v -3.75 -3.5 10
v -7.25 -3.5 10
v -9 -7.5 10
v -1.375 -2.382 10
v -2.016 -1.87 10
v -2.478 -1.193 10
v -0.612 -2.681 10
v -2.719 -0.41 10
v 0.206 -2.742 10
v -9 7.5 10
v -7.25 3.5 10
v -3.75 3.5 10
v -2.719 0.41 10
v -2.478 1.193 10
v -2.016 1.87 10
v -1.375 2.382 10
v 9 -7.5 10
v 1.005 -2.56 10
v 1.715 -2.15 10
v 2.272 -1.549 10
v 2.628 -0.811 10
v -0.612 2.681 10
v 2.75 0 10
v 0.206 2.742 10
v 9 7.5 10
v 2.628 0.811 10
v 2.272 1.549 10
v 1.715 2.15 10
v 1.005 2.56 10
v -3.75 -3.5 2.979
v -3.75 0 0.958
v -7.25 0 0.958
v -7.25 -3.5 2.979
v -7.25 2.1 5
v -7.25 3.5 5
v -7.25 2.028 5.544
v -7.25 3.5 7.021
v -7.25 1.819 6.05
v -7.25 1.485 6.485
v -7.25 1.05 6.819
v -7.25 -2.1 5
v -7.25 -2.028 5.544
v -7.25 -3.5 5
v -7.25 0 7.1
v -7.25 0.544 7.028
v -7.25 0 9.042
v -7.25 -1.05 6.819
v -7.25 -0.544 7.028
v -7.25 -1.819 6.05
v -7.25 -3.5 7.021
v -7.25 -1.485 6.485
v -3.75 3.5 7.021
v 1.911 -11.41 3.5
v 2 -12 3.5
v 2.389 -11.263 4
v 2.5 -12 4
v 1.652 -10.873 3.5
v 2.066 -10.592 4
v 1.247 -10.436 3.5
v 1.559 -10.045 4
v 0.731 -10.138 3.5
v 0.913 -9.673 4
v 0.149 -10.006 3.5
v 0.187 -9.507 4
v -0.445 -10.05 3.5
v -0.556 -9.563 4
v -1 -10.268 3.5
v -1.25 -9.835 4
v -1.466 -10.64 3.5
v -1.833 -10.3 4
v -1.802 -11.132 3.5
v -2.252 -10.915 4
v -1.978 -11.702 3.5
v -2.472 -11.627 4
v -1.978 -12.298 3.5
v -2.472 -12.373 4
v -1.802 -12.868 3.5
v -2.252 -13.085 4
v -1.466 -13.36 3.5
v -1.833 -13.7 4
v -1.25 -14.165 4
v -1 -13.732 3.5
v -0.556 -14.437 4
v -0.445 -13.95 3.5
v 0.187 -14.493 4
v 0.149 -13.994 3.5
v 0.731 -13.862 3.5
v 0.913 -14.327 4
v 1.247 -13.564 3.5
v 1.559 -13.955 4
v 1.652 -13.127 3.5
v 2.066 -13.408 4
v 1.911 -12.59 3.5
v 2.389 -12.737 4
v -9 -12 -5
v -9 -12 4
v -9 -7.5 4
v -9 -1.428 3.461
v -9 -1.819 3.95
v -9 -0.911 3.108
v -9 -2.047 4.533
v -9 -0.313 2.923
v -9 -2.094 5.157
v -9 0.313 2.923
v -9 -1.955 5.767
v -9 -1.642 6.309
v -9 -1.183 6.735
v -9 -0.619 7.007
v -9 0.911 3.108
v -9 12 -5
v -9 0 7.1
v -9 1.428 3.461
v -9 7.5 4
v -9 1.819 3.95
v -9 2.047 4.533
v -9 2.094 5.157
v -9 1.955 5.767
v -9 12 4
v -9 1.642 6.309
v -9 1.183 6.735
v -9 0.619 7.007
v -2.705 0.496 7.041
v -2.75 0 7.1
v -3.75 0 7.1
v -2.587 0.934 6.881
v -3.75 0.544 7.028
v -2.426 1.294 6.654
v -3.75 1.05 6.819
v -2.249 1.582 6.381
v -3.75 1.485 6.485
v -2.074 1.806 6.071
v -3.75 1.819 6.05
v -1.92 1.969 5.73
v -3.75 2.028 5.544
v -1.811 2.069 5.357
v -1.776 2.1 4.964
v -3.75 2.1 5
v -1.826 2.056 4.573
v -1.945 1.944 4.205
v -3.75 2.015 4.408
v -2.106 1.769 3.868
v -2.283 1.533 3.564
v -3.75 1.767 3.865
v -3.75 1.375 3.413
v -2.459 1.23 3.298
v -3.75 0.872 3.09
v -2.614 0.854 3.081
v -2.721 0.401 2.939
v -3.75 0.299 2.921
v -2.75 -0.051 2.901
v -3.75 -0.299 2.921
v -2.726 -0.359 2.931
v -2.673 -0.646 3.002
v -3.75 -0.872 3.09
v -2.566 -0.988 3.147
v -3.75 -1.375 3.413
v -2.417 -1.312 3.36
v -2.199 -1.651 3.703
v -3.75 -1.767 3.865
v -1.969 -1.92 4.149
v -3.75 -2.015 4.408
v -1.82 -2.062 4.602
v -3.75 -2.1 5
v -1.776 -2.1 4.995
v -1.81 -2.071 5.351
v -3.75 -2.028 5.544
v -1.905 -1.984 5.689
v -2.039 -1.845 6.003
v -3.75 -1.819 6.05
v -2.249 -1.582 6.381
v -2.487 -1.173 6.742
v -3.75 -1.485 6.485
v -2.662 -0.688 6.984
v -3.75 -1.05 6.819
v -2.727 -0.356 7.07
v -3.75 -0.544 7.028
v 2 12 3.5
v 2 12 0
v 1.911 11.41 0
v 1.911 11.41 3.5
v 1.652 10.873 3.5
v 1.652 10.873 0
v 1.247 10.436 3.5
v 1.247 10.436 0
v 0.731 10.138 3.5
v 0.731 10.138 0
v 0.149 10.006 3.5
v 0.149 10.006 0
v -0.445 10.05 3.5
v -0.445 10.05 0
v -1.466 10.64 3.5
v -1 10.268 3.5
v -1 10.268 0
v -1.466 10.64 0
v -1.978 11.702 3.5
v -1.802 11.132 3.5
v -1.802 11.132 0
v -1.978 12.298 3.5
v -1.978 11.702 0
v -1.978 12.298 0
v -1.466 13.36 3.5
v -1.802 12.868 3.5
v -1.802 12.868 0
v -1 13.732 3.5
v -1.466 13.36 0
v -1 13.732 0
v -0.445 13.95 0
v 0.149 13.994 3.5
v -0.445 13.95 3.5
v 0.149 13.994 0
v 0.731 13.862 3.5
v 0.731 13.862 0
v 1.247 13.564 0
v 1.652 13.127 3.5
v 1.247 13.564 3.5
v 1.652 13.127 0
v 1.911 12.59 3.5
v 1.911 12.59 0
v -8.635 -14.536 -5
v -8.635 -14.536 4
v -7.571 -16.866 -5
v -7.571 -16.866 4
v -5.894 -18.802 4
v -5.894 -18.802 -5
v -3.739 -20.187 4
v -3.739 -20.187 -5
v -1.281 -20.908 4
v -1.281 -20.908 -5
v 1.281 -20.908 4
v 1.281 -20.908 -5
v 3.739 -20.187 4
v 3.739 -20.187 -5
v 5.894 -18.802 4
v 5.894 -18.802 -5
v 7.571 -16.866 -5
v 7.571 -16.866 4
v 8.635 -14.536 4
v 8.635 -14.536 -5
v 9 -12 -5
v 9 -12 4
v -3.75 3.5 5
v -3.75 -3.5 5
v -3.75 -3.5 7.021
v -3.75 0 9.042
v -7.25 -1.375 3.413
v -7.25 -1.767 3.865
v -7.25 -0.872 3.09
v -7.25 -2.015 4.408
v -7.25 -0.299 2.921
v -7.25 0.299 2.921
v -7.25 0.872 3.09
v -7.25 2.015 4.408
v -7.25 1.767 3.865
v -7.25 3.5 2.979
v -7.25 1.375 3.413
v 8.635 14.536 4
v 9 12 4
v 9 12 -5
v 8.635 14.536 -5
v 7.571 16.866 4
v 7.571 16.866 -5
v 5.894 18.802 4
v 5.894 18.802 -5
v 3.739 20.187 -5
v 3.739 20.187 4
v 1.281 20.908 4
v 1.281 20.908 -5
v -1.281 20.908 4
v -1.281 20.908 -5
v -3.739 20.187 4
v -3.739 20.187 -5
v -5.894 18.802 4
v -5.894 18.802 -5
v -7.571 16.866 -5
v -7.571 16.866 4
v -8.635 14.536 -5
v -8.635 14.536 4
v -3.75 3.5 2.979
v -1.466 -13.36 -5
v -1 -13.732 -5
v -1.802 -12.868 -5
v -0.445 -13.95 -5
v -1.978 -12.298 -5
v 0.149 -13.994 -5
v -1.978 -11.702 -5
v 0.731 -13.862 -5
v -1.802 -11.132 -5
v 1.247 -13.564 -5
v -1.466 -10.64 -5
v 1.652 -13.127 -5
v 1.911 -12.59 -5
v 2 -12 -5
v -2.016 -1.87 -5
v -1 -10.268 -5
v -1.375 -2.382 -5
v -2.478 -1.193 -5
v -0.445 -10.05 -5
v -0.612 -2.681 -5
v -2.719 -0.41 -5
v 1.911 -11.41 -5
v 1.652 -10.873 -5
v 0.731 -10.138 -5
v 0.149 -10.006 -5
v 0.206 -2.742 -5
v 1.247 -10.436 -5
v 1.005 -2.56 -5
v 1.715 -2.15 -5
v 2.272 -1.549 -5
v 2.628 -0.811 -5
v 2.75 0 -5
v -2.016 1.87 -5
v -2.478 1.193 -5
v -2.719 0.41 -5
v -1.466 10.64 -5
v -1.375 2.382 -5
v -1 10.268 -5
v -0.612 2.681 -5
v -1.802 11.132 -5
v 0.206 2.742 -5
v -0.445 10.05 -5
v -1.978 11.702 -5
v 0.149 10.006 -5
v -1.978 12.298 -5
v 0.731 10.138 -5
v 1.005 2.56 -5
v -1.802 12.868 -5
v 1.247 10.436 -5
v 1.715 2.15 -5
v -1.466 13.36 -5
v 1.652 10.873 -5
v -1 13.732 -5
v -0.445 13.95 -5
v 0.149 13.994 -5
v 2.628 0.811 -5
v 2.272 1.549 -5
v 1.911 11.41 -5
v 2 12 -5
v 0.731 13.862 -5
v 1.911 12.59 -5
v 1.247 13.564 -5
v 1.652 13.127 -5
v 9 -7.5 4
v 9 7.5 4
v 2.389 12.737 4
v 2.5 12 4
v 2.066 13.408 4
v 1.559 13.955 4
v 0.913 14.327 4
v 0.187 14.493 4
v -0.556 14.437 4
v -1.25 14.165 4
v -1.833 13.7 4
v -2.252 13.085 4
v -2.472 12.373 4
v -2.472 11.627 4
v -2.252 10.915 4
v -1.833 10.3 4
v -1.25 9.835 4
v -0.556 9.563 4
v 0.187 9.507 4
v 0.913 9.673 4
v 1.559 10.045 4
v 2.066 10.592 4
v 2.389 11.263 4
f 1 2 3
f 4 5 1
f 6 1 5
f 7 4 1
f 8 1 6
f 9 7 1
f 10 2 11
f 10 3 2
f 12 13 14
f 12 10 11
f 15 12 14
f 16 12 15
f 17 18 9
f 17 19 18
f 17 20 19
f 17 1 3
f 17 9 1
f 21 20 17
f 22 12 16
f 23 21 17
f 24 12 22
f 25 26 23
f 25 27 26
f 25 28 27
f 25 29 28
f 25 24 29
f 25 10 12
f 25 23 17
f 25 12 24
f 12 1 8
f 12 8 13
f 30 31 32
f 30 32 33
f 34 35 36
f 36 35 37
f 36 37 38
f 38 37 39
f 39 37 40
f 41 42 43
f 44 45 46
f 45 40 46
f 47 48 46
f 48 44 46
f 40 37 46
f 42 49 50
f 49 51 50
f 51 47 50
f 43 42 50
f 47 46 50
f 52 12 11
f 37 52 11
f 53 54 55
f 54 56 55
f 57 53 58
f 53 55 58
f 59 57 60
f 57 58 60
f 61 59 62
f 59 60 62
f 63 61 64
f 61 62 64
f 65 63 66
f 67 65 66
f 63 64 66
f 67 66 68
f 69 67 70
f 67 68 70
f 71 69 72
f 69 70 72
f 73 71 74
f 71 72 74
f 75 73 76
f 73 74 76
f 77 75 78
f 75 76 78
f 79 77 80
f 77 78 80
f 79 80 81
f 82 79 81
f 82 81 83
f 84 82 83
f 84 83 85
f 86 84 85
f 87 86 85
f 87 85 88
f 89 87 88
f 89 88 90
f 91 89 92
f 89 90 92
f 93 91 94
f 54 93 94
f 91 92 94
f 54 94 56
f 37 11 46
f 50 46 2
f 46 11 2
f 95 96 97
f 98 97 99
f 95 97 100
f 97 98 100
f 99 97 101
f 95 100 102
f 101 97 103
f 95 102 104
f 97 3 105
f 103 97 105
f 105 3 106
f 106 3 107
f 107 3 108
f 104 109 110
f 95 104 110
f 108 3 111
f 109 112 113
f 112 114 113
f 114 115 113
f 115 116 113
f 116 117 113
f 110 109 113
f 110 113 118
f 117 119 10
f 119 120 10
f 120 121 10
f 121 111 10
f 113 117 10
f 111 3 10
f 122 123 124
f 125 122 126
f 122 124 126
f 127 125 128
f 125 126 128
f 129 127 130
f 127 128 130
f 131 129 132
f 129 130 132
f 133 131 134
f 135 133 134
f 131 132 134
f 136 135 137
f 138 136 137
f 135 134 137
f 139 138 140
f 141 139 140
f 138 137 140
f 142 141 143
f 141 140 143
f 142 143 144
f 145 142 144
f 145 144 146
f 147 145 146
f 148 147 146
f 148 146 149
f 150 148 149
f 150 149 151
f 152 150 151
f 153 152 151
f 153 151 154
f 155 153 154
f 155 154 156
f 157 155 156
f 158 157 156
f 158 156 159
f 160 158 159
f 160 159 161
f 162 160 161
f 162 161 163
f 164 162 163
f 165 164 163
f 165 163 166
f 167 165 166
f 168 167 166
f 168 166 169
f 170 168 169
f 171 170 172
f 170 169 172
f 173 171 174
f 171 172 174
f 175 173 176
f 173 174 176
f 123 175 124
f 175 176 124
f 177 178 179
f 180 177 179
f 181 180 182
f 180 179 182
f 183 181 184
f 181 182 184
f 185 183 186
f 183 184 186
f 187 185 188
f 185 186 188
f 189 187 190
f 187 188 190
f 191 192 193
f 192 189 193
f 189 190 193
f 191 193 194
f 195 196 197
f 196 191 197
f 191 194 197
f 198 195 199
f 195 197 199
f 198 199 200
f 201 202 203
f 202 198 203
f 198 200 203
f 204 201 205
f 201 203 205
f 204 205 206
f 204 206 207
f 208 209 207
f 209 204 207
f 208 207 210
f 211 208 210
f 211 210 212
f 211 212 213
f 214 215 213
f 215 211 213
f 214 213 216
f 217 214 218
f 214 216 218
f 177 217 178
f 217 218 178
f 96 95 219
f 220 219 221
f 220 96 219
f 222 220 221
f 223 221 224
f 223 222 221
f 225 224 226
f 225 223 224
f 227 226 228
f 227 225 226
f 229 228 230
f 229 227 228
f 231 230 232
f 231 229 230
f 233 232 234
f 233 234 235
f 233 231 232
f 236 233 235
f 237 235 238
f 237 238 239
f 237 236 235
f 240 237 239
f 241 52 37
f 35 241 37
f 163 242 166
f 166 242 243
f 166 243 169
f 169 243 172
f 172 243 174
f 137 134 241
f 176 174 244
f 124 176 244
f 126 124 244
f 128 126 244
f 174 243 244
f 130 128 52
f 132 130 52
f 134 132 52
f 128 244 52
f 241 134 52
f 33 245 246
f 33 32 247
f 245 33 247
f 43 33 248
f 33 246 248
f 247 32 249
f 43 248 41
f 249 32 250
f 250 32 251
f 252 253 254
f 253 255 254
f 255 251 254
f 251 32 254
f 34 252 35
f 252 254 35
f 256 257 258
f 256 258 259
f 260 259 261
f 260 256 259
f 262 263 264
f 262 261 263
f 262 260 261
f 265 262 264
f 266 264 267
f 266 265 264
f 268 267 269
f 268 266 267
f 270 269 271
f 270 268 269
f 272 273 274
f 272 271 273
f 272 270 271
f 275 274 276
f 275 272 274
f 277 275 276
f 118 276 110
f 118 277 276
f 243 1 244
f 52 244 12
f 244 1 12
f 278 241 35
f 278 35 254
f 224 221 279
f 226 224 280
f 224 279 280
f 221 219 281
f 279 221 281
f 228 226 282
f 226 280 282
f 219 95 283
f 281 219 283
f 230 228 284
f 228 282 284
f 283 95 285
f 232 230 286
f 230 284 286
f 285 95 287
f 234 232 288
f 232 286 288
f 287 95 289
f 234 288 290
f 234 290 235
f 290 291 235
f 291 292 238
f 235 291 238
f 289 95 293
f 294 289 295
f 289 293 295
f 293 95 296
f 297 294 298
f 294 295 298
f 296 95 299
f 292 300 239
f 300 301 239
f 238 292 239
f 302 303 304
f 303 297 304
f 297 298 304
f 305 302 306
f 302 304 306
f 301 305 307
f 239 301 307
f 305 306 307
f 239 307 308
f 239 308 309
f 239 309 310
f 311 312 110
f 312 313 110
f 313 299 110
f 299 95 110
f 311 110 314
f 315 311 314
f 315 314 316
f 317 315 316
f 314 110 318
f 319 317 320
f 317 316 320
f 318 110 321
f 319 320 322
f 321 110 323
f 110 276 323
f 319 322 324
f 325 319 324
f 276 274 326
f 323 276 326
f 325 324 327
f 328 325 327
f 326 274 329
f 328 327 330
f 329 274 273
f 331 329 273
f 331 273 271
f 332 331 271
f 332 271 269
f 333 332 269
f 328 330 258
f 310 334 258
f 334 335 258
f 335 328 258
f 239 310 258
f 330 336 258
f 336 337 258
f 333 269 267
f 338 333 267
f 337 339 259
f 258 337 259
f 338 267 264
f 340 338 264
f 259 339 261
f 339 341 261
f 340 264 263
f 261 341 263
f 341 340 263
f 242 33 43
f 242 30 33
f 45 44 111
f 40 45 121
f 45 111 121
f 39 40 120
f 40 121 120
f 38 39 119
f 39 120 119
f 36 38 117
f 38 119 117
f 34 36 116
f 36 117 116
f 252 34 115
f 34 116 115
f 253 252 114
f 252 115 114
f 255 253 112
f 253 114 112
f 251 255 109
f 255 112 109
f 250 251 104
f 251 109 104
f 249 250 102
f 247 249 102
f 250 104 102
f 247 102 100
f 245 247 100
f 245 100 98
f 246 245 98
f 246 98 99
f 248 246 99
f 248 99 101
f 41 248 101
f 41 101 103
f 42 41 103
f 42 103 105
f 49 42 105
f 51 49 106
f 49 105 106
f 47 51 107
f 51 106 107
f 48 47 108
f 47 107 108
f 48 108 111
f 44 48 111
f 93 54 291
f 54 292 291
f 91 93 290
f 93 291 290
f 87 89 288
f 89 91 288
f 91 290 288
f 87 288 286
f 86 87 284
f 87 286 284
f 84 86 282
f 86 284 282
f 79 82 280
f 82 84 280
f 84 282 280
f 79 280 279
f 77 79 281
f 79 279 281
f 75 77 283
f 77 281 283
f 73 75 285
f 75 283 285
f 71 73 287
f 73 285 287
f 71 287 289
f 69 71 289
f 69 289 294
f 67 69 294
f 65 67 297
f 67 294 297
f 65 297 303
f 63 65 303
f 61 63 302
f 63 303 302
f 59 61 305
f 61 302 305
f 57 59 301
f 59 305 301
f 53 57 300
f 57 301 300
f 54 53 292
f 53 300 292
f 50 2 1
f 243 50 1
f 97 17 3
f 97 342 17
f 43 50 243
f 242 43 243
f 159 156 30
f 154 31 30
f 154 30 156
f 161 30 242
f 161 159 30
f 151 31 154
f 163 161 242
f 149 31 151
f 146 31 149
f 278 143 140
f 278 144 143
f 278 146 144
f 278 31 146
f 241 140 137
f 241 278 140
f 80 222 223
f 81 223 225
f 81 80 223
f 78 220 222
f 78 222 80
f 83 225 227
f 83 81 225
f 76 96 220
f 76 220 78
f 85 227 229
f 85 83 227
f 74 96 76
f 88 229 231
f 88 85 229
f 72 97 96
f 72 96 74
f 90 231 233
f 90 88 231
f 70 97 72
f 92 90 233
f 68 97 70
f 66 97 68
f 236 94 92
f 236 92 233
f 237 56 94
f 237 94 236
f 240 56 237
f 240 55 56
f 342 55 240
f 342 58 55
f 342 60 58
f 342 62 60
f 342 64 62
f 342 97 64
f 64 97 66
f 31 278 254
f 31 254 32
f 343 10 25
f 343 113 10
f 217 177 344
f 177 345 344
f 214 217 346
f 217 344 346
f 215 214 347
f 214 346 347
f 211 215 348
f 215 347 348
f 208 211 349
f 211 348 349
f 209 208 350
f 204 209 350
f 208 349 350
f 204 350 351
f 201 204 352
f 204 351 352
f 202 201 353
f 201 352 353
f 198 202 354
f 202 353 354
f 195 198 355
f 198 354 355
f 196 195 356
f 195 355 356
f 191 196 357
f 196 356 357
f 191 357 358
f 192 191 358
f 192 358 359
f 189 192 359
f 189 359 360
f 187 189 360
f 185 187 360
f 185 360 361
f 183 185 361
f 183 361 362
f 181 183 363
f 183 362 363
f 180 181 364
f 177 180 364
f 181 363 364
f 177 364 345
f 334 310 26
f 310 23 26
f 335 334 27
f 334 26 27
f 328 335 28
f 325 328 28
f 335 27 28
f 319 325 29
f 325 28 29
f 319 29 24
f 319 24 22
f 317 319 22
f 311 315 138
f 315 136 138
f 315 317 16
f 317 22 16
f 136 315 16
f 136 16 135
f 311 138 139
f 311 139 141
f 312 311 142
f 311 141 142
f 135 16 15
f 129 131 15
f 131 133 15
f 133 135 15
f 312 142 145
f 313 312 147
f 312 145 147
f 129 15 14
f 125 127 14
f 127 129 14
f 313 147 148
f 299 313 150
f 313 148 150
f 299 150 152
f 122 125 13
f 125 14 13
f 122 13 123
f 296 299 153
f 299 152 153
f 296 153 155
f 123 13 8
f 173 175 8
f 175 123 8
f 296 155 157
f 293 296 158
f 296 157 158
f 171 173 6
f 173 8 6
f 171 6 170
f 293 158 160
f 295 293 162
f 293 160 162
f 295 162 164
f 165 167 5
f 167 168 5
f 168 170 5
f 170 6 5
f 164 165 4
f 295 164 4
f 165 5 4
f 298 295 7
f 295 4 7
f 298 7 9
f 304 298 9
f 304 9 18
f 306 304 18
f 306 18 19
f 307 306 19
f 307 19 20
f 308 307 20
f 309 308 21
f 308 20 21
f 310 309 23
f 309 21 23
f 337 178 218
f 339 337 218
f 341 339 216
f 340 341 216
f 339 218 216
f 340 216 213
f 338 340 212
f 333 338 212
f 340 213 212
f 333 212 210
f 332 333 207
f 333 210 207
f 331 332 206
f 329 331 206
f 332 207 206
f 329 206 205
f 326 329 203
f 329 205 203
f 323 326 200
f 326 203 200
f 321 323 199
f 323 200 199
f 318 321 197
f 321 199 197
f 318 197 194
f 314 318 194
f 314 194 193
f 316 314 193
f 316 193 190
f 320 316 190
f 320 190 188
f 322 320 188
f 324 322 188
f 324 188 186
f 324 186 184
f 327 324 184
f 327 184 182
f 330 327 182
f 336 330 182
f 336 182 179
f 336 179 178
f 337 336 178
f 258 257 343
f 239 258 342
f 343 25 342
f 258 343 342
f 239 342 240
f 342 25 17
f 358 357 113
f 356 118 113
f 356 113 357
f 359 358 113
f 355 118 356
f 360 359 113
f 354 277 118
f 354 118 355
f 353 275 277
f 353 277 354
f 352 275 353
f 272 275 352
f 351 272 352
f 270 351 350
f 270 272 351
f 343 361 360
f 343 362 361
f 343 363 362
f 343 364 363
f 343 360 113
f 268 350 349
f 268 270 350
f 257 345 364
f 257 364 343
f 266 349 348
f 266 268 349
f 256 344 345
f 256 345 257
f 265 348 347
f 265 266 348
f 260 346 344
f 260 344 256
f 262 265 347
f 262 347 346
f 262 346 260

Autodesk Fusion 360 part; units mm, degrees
sketch "Sketch1" plane through (0, 0, 0) normal (0, 0, 1) x (1, 0, 0)
  line L0 (-9, -12) -> (-9, 12)
  line L1 (9, 12) -> (9, -12)
  line L2 (9, -21) -> (-9, 21) construction
  line L3 (-9, -21) -> (9, 21) construction
  line L4 (9, -7.5) -> (-9, -7.5)
  line L5 (-9, -7.5) -> (-9, 7.5)
  line L6 (-9, 7.5) -> (9, 7.5)
  line L7 (9, 7.5) -> (9, -7.5)
  line L8 (9, -7.5) -> (-9, 7.5) construction
  line L9 (-9, -7.5) -> (9, 7.5) construction
  circle A0 centre (0, 0) radius 2.75
  arc A1 (0, 21) -> (-9, 12) centre (0, 12) ccw
  arc A2 (9, 12) -> (0, 21) centre (0, 12) ccw
  arc A3 (0, -21) -> (9, -12) centre (0, -12) ccw
  arc A4 (-9, -12) -> (0, -21) centre (0, -12) ccw
  line L10 (0, -21.9731) -> (0, 33.0269) construction
  line L11 (2.0496, 8.45) -> (4.0992, 12)
  line L12 (4.0992, 12) -> (2.0496, 15.55)
  line L13 (2.0496, 15.55) -> (-2.0496, 15.55)
  line L14 (-2.0496, 15.55) -> (-4.0992, 12)
  line L15 (-4.0992, 12) -> (-2.0496, 8.45)
  line L16 (-2.0496, 8.45) -> (2.0496, 8.45)
  line L17 (2.0496, -15.55) -> (4.0992, -12)
  line L18 (4.0992, -12) -> (2.0496, -8.45)
  line L19 (2.0496, -8.45) -> (-2.0496, -8.45)
  line L20 (-2.0496, -8.45) -> (-4.0992, -12)
  line L21 (-4.0992, -12) -> (-2.0496, -15.55)
  line L22 (-2.0496, -15.55) -> (2.0496, -15.55)
  circle A5 centre (0, 12) radius 2
  circle A6 centre (0, -12) radius 2
  line L23 (-9, 0) -> (0, 0) construction
  line L24 (-3.75, 3.5) -> (-7.25, 3.5)
  line L25 (-7.25, 3.5) -> (-7.25, -3.5)
  line L26 (-7.25, -3.5) -> (-3.75, -3.5)
  line L27 (-3.75, -3.5) -> (-3.75, 3.5)
  line L28 (-3.75, 3.5) -> (-7.25, -3.5) construction
  line L29 (-7.25, 3.5) -> (-3.75, -3.5) construction
  point P0 (0, 12)
  point P1 (0, -12)
  point P2 (-5.5, 0)
  dimension "d14" = 18
  dimension "d15" = 42
  dimension "d16" = 18
  dimension "d17" = 15
  dimension "d18" = 5.5
  dimension "d19" = 9
  dimension "d20" = 12
  dimension "d21" = 12
  dimension "d22" = 3.55
  dimension "d23" = 3.55
  dimension "d24" = 4
  dimension "d25" = 4
  dimension "d26" = 3.5
  dimension "d27" = 7
  dimension "d28" = 3.5
extrude "Extrude1" add sketch "Sketch1" against normal blind 5 contours L0 L1 L4 A3 A4 | L0 L1 L4 L5 L6 L7 | L0 L1 L6 A1 A2 | L11 L12 L13 L14 L15 L16 | L17 L18 L19 L20 L21 L22 | L24 L25 L26 L27
extrude "Extrude2" add sketch "Sketch1" along normal blind 10 contours L0 L1 L4 L5 L6 L7 | L24 L25 L26 L27
extrude "Extrude3" [suppressed]
extrude "Extrude7" add sketch "Sketch1" along normal blind 4 contours L0 L1 L4 A3 A4 | L0 L1 L6 A1 A2 | L11 L12 L13 L14 L15 L16 | L17 L18 L19 L20 L21 L22
extrude "Extrude4" cut sketch "Sketch1" against normal blind 5 from surface at 10 contours L24 L25 L26 L27
sketch "Sketch2" plane through (-3.75, 0, 0) normal (-1, 0, 0) x (0, 0, 1)
  line L0 (10, -3.5) -> (10, 3.5)
  line L1 (10, 3.5) -> (5, 3.5)
  line L2 (5, 3.5) -> (5, -3.5)
  line L3 (5, -3.5) -> (10, -3.5)
  line L4 (9.0415, 0) -> (7.0207, 3.5)
  line L5 (7.0207, 3.5) -> (2.9793, 3.5)
  line L6 (2.9793, 3.5) -> (0.9585, 0)
  line L7 (0.9585, 0) -> (2.9793, -3.5)
  line L8 (2.9793, -3.5) -> (7.0207, -3.5)
  line L9 (7.0207, -3.5) -> (9.0415, 0)
  circle A0 centre (5, 0) radius 2.1
  point P0 (5, 0)
  dimension "d38" = 3.5
  dimension "d41" = 4.2
extrude "Extrude5" cut sketch "Sketch2" along normal up to surface (3.5 mm away) contours L1 L2 L3 L4 L5 L8 L9 A0 | L2 L5 L6 L7 L8 A0 | L2 A0 | L2 A0
extrude "Extrude6" cut sketch "Sketch2" against normal blind 9 from surface at 5.25 contours L2 A0 | L2 A0
chamfer "Chamfer1" [suppressed]
chamfer "Chamfer2" distance 0.5 angle 45 2 edges at (-1.8647, 12.7232, 4) (-1.8647, -11.2768, 4)
